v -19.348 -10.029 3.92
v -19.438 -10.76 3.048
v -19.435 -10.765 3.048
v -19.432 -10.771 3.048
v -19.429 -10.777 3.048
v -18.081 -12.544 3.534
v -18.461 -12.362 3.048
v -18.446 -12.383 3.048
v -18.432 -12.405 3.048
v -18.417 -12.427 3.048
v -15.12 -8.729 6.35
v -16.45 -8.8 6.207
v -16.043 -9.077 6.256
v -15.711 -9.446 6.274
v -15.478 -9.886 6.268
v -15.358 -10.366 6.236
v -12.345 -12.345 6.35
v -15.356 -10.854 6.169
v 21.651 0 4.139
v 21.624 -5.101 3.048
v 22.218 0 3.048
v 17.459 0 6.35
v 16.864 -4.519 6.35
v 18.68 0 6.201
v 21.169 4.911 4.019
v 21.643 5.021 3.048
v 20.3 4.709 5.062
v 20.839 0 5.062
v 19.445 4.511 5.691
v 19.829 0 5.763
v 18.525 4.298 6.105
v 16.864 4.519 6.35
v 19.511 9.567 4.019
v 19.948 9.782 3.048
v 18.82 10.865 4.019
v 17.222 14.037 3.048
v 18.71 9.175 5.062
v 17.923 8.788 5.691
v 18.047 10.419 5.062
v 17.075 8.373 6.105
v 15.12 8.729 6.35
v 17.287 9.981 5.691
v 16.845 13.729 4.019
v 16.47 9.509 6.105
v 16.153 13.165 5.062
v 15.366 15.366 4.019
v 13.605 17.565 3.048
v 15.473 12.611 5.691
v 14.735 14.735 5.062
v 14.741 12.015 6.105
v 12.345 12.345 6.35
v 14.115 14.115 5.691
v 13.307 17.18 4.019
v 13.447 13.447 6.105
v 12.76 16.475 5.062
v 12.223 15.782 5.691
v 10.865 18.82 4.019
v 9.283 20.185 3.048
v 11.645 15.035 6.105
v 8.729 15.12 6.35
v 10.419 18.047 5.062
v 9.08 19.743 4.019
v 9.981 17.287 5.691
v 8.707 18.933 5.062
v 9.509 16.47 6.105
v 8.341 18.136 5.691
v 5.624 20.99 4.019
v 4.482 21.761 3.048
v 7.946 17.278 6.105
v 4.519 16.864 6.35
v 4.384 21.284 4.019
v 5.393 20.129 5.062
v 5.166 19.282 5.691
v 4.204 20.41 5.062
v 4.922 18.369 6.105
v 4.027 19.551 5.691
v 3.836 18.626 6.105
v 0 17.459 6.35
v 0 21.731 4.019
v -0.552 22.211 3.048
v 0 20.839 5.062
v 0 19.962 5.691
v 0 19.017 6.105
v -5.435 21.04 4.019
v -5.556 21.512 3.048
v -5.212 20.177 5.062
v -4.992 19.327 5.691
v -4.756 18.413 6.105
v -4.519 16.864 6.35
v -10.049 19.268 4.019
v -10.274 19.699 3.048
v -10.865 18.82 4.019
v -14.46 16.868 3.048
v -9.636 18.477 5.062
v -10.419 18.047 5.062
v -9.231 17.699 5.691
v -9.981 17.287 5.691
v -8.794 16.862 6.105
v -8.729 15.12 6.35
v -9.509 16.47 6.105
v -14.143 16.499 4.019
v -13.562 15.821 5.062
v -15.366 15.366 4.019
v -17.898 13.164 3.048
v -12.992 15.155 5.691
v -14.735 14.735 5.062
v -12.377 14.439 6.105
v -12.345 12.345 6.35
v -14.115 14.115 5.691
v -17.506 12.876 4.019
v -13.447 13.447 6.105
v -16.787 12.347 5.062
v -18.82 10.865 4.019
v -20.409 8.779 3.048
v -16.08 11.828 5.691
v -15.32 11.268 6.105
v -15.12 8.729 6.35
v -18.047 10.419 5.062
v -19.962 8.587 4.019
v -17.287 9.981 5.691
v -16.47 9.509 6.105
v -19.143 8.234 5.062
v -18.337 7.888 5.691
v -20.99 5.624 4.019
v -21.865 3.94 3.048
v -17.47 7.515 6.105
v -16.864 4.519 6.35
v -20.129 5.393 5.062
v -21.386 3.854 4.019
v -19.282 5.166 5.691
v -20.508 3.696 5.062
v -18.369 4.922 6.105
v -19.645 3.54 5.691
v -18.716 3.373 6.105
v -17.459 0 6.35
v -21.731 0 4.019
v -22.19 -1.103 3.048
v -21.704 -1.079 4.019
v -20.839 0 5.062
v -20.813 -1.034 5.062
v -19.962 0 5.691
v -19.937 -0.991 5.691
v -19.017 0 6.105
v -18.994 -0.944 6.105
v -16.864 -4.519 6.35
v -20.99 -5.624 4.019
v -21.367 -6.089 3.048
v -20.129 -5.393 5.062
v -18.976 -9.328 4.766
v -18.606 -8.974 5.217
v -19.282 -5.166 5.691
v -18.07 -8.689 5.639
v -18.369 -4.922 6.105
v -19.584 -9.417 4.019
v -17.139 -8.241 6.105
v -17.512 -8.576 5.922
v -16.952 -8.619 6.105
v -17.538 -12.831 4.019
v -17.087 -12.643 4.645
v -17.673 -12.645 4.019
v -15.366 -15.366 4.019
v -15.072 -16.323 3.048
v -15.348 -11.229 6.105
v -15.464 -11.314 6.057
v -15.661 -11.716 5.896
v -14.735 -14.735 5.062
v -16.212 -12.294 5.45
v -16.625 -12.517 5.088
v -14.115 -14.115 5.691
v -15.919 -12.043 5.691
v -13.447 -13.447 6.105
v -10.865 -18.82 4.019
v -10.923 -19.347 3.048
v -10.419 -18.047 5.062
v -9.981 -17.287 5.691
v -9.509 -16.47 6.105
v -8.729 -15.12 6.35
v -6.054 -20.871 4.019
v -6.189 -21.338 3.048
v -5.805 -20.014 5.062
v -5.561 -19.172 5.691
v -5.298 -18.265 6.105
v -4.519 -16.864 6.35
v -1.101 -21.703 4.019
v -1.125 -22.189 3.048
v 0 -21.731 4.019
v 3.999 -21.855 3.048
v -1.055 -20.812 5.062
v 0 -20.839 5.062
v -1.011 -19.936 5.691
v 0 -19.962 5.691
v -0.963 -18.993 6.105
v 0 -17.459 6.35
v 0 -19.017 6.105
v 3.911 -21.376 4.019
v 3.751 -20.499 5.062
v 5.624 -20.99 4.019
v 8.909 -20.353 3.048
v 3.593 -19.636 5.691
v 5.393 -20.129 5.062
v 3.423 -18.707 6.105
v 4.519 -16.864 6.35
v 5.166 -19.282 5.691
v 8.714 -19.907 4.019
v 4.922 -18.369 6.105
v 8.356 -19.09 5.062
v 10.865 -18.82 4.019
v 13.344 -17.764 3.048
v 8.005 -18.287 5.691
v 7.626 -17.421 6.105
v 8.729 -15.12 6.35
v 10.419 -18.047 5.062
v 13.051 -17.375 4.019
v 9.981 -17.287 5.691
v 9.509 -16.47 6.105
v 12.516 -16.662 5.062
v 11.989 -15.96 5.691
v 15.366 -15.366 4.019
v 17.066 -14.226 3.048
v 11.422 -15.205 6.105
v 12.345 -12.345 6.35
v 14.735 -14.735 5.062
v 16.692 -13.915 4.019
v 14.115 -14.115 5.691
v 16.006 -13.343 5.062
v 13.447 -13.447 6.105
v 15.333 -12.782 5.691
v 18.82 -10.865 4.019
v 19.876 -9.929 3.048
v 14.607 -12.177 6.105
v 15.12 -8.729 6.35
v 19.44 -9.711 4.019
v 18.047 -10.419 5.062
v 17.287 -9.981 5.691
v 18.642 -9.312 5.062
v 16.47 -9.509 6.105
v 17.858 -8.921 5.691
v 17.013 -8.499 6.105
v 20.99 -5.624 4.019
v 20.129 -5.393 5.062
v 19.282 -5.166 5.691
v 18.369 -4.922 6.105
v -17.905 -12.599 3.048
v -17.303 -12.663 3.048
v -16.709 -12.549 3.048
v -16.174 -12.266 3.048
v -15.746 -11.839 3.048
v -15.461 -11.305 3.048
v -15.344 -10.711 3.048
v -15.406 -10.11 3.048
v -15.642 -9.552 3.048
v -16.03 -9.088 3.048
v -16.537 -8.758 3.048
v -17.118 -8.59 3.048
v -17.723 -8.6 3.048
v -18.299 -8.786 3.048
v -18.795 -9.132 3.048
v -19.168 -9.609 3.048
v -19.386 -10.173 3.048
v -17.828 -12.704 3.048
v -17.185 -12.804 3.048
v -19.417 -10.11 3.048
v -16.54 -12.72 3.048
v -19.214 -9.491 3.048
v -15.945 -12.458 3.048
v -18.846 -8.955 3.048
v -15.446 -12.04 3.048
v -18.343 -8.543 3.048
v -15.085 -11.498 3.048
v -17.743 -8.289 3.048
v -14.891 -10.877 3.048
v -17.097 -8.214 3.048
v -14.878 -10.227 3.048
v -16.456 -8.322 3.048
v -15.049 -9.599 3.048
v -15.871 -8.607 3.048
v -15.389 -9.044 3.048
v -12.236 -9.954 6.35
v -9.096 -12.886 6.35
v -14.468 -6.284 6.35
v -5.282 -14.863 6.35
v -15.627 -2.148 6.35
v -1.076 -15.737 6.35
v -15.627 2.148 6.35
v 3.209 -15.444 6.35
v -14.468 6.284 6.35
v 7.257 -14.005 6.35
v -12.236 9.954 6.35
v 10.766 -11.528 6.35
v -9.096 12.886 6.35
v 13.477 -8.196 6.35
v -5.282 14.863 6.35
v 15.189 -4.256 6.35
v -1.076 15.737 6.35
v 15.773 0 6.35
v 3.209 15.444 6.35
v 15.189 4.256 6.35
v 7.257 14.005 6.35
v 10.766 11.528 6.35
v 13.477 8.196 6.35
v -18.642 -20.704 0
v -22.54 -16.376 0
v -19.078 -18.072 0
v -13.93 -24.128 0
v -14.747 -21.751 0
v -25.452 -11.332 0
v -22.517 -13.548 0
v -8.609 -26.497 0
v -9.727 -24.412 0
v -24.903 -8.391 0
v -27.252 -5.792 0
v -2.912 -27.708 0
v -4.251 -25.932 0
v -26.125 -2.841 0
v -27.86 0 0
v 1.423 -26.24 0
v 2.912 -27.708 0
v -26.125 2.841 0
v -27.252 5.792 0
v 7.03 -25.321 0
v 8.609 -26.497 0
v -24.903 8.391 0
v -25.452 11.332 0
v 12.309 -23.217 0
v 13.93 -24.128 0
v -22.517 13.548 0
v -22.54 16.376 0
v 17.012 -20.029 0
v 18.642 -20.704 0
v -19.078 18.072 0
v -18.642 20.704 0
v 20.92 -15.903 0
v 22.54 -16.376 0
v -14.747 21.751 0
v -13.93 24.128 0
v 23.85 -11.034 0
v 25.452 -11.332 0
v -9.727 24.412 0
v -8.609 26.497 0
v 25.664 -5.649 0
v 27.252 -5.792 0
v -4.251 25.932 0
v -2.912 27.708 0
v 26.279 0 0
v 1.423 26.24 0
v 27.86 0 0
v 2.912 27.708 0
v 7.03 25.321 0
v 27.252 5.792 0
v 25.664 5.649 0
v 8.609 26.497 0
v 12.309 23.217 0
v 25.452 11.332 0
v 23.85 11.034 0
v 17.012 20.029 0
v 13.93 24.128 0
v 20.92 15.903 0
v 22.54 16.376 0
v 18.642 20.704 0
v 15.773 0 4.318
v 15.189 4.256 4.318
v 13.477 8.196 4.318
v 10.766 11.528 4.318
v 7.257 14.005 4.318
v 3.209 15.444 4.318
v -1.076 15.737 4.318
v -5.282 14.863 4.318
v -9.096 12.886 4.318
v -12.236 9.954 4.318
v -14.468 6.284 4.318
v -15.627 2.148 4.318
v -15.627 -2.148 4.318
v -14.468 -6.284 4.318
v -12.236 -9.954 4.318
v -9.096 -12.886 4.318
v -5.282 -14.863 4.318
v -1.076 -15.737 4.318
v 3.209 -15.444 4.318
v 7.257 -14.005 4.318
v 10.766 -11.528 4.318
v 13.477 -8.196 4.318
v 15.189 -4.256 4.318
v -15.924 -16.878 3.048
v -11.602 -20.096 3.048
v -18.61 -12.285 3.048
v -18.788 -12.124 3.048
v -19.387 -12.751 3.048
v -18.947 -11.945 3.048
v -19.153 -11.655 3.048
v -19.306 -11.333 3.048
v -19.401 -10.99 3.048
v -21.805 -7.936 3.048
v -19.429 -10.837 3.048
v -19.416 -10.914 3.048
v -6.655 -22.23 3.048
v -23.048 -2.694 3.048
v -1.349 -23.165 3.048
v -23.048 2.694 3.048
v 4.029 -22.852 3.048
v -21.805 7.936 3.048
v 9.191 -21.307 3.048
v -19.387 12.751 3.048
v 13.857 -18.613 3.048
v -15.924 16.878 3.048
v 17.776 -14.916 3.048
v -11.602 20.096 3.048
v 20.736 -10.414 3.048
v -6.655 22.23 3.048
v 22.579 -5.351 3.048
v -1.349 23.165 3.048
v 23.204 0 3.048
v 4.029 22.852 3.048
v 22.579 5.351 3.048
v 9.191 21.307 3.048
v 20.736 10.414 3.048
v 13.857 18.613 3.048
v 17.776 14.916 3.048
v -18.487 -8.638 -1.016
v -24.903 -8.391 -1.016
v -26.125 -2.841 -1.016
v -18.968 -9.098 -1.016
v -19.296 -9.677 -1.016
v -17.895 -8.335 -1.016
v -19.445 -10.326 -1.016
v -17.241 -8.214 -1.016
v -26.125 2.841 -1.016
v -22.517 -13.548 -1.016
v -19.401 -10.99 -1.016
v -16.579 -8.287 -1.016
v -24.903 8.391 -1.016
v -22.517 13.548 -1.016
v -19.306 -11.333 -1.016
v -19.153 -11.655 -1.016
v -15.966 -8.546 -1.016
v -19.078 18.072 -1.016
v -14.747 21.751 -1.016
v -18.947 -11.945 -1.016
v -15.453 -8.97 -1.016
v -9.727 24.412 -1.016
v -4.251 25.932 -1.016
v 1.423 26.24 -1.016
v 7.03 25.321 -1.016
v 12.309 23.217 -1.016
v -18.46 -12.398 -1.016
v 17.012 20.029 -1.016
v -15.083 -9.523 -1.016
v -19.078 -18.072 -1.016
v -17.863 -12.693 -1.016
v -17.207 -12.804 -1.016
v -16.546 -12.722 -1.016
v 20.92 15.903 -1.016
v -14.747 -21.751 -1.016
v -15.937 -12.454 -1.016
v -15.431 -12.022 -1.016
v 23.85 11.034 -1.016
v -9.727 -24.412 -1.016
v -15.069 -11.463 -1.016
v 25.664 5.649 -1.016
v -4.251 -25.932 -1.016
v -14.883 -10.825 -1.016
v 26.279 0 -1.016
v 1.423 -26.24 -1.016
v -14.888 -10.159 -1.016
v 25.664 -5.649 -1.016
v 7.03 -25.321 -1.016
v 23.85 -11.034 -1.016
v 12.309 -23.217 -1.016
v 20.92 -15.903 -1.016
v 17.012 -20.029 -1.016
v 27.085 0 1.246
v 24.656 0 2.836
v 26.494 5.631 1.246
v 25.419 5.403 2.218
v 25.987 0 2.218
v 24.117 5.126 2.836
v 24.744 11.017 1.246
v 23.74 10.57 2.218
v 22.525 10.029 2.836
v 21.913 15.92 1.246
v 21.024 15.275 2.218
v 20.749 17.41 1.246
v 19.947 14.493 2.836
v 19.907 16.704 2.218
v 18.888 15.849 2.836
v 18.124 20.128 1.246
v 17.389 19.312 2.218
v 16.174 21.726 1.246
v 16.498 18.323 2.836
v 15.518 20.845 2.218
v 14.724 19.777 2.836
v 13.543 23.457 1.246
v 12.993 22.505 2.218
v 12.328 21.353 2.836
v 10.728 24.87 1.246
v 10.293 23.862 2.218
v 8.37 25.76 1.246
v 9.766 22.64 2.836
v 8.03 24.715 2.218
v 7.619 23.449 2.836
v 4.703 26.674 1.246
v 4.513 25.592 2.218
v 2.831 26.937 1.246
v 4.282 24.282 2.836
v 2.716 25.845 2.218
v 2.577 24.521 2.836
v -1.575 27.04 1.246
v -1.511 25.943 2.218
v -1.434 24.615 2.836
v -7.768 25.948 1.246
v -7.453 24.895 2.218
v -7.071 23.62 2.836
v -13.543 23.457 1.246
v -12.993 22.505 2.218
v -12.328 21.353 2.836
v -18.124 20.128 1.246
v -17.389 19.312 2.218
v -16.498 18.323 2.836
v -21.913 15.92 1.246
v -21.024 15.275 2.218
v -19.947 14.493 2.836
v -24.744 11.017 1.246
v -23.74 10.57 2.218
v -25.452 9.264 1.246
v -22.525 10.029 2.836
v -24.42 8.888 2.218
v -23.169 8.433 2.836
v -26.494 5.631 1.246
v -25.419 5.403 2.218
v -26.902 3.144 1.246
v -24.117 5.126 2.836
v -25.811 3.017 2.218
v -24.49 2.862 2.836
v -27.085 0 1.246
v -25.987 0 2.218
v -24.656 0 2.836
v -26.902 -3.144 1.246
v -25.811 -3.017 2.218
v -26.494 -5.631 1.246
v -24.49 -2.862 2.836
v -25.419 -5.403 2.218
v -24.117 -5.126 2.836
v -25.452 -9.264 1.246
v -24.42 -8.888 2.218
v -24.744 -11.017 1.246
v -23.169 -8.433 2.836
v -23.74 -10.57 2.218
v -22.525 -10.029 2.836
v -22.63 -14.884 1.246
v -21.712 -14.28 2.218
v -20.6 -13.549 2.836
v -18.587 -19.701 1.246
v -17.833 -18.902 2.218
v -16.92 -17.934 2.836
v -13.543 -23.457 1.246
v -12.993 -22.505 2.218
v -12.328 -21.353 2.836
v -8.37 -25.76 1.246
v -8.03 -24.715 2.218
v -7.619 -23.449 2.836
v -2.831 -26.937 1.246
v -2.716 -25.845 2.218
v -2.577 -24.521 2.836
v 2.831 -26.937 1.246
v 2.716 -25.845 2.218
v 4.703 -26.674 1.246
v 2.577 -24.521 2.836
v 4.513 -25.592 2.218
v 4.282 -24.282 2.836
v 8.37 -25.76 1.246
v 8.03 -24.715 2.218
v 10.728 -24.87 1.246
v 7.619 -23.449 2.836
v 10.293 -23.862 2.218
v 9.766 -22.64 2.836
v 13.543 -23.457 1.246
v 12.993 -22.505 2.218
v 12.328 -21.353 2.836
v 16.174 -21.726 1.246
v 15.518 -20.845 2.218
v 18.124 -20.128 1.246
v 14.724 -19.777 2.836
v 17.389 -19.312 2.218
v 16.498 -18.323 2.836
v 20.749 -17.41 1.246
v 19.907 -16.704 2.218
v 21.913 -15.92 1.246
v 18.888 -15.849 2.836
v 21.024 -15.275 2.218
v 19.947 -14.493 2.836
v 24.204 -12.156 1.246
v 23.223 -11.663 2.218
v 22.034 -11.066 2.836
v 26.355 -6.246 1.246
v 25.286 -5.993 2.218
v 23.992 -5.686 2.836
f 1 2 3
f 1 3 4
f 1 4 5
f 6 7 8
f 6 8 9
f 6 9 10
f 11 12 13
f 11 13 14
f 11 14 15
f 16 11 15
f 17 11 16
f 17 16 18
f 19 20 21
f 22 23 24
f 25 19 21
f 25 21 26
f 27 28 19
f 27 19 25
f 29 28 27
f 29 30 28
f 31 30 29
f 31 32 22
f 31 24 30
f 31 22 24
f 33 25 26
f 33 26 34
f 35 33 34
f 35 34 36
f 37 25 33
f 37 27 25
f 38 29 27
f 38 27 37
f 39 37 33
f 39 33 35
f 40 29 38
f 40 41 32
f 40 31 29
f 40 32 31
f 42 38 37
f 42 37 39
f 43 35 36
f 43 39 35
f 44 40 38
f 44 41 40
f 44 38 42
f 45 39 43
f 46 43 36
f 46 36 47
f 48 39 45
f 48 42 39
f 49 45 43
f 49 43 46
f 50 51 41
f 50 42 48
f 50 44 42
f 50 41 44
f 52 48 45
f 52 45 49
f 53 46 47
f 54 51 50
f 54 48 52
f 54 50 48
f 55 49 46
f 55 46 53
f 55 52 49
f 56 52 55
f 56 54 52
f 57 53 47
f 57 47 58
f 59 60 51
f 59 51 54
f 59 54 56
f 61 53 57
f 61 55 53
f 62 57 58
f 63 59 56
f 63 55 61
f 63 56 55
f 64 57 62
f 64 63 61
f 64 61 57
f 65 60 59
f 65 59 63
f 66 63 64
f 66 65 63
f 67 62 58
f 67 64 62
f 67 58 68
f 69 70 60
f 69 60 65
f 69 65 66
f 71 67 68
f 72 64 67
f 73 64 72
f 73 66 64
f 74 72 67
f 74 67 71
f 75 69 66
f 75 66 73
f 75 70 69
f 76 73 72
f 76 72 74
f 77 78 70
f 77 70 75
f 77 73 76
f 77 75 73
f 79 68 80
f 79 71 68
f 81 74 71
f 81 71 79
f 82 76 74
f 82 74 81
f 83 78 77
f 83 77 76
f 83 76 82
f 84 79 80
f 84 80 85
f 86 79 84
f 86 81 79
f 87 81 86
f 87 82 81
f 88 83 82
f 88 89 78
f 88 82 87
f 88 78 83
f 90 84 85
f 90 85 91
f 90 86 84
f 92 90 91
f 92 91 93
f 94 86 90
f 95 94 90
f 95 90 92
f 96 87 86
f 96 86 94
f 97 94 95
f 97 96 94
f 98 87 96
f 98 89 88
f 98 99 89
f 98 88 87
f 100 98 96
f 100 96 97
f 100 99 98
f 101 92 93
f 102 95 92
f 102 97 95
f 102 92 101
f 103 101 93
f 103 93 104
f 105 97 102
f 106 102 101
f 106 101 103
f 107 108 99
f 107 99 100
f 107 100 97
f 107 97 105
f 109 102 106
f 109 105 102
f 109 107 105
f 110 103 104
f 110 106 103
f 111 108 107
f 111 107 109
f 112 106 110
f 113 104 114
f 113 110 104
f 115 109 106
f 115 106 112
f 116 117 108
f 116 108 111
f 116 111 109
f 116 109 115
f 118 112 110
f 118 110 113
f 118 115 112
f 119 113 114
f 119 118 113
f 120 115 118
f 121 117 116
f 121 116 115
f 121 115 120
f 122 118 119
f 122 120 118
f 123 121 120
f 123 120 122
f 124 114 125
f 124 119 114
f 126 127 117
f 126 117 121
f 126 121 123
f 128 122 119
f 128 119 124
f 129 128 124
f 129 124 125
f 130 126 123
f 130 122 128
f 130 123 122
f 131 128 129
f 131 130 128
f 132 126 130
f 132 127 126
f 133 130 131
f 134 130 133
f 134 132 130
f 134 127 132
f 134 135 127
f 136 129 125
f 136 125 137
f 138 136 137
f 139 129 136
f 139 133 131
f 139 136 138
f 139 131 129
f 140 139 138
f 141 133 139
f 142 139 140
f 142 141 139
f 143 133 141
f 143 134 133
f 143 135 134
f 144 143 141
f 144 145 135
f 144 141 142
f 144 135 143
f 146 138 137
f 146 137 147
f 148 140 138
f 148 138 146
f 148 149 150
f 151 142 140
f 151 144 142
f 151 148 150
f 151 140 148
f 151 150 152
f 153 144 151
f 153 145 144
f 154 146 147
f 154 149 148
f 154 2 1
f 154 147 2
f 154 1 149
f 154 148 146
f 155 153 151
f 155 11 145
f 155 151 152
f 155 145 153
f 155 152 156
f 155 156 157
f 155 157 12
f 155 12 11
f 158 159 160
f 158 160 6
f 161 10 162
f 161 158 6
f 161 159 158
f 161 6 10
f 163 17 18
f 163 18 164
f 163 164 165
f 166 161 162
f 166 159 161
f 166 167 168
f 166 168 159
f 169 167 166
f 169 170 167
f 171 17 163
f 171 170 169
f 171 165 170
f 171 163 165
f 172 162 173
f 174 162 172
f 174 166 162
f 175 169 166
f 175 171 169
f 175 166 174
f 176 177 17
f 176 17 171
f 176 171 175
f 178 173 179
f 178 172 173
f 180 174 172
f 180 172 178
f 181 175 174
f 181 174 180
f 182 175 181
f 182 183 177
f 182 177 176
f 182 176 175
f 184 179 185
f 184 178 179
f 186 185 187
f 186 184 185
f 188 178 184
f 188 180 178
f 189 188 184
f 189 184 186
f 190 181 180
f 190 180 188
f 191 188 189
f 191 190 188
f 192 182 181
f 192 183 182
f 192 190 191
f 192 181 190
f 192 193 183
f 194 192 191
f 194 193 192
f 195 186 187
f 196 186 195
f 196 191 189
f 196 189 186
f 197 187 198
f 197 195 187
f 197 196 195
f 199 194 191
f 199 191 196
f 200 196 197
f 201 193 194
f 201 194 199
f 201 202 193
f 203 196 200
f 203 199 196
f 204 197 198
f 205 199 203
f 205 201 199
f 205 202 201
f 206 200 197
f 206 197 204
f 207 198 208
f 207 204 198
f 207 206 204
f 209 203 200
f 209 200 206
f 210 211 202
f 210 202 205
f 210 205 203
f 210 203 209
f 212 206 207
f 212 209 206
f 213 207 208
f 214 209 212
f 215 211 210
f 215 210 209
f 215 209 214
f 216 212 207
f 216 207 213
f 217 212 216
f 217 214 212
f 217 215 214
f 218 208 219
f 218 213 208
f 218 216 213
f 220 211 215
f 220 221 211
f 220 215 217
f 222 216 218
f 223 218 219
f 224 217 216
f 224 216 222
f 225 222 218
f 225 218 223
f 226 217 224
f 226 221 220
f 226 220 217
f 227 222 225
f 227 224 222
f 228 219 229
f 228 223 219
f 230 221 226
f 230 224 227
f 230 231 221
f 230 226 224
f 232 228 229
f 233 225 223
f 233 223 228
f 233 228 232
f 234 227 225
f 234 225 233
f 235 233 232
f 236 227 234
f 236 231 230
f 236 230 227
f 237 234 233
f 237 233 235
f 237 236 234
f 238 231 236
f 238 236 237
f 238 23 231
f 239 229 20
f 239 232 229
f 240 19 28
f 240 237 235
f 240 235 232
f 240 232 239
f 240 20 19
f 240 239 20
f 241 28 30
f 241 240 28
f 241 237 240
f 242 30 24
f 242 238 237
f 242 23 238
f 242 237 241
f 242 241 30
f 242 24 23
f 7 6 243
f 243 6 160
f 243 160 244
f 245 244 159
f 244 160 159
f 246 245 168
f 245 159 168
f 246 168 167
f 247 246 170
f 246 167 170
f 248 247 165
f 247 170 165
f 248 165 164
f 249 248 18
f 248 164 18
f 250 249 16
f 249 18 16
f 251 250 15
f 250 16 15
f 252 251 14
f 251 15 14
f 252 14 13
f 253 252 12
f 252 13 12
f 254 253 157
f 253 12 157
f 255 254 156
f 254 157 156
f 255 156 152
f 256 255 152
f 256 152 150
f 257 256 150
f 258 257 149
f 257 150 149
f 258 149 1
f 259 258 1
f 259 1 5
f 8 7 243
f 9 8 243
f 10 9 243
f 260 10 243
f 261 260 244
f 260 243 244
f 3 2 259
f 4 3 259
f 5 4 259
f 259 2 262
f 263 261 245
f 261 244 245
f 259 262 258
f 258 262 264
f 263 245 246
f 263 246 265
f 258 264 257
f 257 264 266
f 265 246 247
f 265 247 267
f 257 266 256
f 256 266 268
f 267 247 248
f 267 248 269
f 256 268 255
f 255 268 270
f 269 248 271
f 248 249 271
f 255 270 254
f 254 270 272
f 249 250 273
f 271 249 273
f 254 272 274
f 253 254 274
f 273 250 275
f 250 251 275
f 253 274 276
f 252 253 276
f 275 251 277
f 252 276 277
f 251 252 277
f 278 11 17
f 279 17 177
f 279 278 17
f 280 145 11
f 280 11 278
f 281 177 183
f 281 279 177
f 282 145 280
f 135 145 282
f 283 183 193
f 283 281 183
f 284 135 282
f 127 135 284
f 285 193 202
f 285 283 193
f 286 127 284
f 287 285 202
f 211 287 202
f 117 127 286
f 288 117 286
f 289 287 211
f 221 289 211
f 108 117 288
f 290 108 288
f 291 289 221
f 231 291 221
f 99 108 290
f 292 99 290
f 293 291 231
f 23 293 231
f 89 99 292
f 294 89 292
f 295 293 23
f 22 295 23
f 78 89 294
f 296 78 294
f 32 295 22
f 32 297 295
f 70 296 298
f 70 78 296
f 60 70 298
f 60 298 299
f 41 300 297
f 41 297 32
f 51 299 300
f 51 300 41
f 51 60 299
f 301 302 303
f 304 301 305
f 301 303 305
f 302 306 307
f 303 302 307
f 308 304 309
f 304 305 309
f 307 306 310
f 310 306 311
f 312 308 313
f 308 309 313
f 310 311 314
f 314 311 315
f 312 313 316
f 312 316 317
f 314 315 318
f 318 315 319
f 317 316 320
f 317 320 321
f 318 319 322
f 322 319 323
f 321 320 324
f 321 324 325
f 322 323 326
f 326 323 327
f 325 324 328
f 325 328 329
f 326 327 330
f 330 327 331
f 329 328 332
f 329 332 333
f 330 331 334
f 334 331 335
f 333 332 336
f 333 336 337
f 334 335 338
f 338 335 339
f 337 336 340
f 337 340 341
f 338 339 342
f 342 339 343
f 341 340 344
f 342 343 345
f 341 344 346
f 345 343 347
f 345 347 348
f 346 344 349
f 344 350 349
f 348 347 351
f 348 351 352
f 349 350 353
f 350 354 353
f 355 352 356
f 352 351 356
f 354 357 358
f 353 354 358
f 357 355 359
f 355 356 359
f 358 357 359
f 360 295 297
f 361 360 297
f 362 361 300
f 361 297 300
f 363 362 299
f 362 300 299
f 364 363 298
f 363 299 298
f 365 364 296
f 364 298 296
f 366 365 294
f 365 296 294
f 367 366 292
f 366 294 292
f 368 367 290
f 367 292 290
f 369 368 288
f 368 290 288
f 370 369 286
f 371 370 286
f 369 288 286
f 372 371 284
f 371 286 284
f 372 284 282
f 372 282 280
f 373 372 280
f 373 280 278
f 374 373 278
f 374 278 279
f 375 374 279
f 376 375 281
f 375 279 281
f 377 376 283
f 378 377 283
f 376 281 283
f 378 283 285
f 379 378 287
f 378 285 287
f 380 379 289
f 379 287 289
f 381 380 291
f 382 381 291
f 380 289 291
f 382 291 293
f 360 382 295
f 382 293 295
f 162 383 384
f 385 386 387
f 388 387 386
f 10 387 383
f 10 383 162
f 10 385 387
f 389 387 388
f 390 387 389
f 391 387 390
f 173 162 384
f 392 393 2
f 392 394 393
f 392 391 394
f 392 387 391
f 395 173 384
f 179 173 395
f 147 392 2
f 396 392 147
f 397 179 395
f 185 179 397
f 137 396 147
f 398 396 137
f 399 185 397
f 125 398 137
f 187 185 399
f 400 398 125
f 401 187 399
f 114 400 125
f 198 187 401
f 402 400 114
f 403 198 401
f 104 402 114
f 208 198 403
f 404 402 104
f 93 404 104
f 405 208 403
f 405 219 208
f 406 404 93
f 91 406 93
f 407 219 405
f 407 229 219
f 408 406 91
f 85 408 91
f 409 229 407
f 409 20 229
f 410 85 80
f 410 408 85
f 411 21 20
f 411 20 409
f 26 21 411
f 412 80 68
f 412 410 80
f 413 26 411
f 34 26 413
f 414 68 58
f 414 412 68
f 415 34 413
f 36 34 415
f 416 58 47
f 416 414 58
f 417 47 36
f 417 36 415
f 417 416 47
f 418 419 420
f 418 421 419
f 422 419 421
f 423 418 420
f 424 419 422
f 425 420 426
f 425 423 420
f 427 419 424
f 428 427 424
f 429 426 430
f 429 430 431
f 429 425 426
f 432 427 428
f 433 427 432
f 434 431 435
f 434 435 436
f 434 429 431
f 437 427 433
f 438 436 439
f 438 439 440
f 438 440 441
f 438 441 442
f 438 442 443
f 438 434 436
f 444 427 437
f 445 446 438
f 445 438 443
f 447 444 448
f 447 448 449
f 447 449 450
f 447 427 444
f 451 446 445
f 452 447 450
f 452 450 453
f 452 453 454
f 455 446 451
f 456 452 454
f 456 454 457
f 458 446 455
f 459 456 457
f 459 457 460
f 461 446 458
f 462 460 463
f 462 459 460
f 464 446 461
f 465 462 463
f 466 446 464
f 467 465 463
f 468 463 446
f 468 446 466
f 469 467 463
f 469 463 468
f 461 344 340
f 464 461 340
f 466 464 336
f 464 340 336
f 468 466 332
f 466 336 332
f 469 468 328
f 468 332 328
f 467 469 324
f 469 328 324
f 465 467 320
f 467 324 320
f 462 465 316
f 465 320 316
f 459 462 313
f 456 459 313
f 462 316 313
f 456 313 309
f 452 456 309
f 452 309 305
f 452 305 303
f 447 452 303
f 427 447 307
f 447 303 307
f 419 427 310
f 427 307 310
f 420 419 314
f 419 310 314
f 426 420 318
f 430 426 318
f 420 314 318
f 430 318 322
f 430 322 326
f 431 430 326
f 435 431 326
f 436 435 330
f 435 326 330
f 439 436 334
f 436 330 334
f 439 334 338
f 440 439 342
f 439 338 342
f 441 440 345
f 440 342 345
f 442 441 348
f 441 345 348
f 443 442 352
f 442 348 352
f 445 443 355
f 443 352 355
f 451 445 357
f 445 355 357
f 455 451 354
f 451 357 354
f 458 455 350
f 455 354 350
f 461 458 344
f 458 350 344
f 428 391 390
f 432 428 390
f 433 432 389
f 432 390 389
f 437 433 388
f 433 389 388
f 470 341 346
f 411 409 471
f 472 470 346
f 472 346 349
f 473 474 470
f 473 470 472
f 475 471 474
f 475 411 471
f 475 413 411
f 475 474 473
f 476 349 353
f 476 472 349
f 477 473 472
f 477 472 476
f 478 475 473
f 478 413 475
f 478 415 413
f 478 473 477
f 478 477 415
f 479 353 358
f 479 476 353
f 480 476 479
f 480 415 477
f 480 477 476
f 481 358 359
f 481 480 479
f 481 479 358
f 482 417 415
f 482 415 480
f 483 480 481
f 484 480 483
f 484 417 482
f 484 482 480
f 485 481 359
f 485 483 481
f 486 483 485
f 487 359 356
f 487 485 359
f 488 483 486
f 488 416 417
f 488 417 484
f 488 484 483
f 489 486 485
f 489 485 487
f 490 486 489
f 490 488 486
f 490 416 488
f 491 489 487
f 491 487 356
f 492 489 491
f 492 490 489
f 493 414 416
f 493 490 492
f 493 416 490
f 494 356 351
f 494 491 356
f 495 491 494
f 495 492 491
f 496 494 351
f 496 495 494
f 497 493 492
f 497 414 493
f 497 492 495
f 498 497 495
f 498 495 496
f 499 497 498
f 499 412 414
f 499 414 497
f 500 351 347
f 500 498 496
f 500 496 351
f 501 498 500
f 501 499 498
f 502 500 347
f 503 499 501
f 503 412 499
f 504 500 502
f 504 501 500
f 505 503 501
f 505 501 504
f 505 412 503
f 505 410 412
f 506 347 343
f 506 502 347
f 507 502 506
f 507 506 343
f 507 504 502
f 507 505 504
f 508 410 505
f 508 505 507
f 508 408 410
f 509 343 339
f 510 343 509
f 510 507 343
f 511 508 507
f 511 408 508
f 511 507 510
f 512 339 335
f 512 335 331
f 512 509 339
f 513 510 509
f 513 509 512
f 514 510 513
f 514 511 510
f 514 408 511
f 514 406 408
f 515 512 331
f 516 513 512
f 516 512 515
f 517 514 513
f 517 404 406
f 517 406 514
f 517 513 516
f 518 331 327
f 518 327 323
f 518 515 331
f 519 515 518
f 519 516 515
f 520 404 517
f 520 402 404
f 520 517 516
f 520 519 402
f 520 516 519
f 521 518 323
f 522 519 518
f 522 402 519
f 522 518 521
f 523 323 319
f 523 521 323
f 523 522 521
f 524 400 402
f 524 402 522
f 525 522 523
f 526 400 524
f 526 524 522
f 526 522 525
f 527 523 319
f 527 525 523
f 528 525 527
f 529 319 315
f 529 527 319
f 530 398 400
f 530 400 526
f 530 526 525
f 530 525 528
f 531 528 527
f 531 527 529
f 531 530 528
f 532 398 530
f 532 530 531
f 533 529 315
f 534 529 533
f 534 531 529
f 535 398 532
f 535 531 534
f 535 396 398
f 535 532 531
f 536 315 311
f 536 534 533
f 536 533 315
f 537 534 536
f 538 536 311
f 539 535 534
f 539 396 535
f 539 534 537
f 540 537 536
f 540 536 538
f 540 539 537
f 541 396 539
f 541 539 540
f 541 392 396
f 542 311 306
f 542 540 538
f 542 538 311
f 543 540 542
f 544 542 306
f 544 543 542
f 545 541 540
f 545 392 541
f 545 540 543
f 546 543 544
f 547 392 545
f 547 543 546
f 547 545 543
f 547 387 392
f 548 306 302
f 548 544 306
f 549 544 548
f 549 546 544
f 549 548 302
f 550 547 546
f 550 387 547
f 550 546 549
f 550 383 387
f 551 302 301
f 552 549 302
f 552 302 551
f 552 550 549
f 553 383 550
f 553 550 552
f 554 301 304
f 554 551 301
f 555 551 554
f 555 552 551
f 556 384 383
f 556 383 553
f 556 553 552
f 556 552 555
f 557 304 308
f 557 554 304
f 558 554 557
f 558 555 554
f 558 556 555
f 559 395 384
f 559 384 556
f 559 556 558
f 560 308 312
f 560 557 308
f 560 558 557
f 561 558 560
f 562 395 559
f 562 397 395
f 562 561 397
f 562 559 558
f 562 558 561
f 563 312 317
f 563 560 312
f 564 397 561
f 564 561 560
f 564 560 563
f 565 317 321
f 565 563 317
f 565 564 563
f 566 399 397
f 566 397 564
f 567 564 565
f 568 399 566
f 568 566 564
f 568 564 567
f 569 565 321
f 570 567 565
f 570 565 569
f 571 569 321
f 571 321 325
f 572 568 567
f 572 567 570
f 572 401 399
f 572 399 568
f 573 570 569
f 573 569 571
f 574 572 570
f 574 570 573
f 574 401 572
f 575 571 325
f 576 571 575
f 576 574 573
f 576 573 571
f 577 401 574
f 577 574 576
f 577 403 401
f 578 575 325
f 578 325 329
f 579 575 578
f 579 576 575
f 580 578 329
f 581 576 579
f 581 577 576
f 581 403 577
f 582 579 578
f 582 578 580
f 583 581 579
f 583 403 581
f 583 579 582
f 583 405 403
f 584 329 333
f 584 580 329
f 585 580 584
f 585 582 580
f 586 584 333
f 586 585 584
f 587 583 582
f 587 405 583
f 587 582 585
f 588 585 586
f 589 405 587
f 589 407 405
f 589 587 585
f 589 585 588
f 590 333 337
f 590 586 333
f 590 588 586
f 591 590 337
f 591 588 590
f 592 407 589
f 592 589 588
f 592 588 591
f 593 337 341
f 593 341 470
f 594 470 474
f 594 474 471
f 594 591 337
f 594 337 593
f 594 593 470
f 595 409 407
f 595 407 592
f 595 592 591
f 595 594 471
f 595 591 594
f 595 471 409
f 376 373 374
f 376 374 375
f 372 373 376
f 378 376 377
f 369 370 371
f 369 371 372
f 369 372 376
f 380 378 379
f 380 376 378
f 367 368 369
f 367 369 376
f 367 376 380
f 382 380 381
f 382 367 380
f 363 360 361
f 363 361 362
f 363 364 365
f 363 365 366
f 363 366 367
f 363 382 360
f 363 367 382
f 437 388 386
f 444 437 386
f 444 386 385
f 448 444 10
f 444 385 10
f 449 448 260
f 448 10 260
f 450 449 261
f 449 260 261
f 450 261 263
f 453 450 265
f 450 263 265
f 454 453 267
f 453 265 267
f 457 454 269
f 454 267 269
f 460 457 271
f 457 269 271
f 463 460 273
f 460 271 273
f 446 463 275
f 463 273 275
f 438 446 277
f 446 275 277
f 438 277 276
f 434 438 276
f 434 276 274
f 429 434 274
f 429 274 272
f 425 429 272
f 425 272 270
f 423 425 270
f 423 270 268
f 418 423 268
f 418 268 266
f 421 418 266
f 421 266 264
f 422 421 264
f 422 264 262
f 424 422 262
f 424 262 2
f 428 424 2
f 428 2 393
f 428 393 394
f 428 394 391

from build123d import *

# Parameters (mm, degrees)
F0_R      = 27.8603665739
F1_DEPTH  = 3.048
F4_R      = 26.2786257822
F5_DEPTH  = 1.016
F6_R      = 22.2176168744
F7_DEPTH  = 3.302
F9_R      = 15.773437446
F10_DEPTH = 2.032
F11_R     = 2.2956006308
F12_DEPTH = 21.336
F13_R     = 2.0464830212
F14_DEPTH = 25.4


# Not quite as in the source:
# - a fillet or chamfer that OpenCascade refuses, or shapes differently, is made with other operations: its cross-section is extruded or revolved along the edge and cut away or added


with BuildPart() as f1:
    # F0 (on Top) → F1 (new body)
    with BuildSketch(Plane.XY):
        Circle(F0_R)
    extrude(amount=F1_DEPTH)

    # F2: fillet of radius 5.08 on 1 edges, made by hand

    # F2_s1 → F2_t2 (revolve, cut)
    with BuildSketch(Plane.XZ):
        with BuildLine():
            ThreePointArc((27.8603665739, 0), (25.9869002599, 2.2182329348), (23.2044696678, 3.048))
            Line((23.2044696678, 3.048), (27.8603665739, 3.048))
            Line((27.8603665739, 3.048), (27.8603665739, 0))
        make_face()
    revolve(axis=Axis((0, 0, 3.048), (0, 0, 1)), mode=Mode.SUBTRACT)

    # F4 (on face) → F5 (join)
    with BuildSketch(Plane(origin=(0, 0, 0), x_dir=(1, 0, 0), z_dir=(0, 0, -1))):
        Circle(F4_R)
    extrude(amount=F5_DEPTH)

    # F6 (on face) → F7 (join)
    with BuildSketch(Plane.XY.offset(3.048)):
        Circle(F6_R)
    extrude(amount=F7_DEPTH)

    # F8: fillet of radius 5.08 on 1 edges, made by hand

    # F8_s1 → F8_t2 (revolve, cut)
    with BuildSketch(Plane.XZ):
        with BuildLine():
            ThreePointArc((22.2176168744, 3.048), (20.3549739793, 5.4436458882), (17.4589283996, 6.35))
            Line((17.4589283996, 6.35), (22.2176168744, 6.35))
            Line((22.2176168744, 6.35), (22.2176168744, 3.048))
        make_face()
    revolve(axis=Axis((0, 0, 6.35), (0, 0, 1)), mode=Mode.SUBTRACT)

    # F9 (on face) → F10 (cut)
    with BuildSketch(Plane.XY.offset(6.35)):
        Circle(F9_R)
    extrude(amount=-F10_DEPTH, mode=Mode.SUBTRACT)

    # F11 (on face) → F12 (cut)
    with BuildSketch(Plane.XY.offset(3.048)):
        with Locations((-17.1565320343, -10.5084851384)):
            Circle(F11_R)
    extrude(amount=-F12_DEPTH, mode=Mode.SUBTRACT)

    # F13 (on face) → F14 (cut)
    with BuildSketch(Plane.XY.offset(6.35)):
        with Locations((-17.3885338008, -10.6187639758)):
            Circle(F13_R)
    extrude(amount=-F14_DEPTH, mode=Mode.SUBTRACT)


solid = f1.part
